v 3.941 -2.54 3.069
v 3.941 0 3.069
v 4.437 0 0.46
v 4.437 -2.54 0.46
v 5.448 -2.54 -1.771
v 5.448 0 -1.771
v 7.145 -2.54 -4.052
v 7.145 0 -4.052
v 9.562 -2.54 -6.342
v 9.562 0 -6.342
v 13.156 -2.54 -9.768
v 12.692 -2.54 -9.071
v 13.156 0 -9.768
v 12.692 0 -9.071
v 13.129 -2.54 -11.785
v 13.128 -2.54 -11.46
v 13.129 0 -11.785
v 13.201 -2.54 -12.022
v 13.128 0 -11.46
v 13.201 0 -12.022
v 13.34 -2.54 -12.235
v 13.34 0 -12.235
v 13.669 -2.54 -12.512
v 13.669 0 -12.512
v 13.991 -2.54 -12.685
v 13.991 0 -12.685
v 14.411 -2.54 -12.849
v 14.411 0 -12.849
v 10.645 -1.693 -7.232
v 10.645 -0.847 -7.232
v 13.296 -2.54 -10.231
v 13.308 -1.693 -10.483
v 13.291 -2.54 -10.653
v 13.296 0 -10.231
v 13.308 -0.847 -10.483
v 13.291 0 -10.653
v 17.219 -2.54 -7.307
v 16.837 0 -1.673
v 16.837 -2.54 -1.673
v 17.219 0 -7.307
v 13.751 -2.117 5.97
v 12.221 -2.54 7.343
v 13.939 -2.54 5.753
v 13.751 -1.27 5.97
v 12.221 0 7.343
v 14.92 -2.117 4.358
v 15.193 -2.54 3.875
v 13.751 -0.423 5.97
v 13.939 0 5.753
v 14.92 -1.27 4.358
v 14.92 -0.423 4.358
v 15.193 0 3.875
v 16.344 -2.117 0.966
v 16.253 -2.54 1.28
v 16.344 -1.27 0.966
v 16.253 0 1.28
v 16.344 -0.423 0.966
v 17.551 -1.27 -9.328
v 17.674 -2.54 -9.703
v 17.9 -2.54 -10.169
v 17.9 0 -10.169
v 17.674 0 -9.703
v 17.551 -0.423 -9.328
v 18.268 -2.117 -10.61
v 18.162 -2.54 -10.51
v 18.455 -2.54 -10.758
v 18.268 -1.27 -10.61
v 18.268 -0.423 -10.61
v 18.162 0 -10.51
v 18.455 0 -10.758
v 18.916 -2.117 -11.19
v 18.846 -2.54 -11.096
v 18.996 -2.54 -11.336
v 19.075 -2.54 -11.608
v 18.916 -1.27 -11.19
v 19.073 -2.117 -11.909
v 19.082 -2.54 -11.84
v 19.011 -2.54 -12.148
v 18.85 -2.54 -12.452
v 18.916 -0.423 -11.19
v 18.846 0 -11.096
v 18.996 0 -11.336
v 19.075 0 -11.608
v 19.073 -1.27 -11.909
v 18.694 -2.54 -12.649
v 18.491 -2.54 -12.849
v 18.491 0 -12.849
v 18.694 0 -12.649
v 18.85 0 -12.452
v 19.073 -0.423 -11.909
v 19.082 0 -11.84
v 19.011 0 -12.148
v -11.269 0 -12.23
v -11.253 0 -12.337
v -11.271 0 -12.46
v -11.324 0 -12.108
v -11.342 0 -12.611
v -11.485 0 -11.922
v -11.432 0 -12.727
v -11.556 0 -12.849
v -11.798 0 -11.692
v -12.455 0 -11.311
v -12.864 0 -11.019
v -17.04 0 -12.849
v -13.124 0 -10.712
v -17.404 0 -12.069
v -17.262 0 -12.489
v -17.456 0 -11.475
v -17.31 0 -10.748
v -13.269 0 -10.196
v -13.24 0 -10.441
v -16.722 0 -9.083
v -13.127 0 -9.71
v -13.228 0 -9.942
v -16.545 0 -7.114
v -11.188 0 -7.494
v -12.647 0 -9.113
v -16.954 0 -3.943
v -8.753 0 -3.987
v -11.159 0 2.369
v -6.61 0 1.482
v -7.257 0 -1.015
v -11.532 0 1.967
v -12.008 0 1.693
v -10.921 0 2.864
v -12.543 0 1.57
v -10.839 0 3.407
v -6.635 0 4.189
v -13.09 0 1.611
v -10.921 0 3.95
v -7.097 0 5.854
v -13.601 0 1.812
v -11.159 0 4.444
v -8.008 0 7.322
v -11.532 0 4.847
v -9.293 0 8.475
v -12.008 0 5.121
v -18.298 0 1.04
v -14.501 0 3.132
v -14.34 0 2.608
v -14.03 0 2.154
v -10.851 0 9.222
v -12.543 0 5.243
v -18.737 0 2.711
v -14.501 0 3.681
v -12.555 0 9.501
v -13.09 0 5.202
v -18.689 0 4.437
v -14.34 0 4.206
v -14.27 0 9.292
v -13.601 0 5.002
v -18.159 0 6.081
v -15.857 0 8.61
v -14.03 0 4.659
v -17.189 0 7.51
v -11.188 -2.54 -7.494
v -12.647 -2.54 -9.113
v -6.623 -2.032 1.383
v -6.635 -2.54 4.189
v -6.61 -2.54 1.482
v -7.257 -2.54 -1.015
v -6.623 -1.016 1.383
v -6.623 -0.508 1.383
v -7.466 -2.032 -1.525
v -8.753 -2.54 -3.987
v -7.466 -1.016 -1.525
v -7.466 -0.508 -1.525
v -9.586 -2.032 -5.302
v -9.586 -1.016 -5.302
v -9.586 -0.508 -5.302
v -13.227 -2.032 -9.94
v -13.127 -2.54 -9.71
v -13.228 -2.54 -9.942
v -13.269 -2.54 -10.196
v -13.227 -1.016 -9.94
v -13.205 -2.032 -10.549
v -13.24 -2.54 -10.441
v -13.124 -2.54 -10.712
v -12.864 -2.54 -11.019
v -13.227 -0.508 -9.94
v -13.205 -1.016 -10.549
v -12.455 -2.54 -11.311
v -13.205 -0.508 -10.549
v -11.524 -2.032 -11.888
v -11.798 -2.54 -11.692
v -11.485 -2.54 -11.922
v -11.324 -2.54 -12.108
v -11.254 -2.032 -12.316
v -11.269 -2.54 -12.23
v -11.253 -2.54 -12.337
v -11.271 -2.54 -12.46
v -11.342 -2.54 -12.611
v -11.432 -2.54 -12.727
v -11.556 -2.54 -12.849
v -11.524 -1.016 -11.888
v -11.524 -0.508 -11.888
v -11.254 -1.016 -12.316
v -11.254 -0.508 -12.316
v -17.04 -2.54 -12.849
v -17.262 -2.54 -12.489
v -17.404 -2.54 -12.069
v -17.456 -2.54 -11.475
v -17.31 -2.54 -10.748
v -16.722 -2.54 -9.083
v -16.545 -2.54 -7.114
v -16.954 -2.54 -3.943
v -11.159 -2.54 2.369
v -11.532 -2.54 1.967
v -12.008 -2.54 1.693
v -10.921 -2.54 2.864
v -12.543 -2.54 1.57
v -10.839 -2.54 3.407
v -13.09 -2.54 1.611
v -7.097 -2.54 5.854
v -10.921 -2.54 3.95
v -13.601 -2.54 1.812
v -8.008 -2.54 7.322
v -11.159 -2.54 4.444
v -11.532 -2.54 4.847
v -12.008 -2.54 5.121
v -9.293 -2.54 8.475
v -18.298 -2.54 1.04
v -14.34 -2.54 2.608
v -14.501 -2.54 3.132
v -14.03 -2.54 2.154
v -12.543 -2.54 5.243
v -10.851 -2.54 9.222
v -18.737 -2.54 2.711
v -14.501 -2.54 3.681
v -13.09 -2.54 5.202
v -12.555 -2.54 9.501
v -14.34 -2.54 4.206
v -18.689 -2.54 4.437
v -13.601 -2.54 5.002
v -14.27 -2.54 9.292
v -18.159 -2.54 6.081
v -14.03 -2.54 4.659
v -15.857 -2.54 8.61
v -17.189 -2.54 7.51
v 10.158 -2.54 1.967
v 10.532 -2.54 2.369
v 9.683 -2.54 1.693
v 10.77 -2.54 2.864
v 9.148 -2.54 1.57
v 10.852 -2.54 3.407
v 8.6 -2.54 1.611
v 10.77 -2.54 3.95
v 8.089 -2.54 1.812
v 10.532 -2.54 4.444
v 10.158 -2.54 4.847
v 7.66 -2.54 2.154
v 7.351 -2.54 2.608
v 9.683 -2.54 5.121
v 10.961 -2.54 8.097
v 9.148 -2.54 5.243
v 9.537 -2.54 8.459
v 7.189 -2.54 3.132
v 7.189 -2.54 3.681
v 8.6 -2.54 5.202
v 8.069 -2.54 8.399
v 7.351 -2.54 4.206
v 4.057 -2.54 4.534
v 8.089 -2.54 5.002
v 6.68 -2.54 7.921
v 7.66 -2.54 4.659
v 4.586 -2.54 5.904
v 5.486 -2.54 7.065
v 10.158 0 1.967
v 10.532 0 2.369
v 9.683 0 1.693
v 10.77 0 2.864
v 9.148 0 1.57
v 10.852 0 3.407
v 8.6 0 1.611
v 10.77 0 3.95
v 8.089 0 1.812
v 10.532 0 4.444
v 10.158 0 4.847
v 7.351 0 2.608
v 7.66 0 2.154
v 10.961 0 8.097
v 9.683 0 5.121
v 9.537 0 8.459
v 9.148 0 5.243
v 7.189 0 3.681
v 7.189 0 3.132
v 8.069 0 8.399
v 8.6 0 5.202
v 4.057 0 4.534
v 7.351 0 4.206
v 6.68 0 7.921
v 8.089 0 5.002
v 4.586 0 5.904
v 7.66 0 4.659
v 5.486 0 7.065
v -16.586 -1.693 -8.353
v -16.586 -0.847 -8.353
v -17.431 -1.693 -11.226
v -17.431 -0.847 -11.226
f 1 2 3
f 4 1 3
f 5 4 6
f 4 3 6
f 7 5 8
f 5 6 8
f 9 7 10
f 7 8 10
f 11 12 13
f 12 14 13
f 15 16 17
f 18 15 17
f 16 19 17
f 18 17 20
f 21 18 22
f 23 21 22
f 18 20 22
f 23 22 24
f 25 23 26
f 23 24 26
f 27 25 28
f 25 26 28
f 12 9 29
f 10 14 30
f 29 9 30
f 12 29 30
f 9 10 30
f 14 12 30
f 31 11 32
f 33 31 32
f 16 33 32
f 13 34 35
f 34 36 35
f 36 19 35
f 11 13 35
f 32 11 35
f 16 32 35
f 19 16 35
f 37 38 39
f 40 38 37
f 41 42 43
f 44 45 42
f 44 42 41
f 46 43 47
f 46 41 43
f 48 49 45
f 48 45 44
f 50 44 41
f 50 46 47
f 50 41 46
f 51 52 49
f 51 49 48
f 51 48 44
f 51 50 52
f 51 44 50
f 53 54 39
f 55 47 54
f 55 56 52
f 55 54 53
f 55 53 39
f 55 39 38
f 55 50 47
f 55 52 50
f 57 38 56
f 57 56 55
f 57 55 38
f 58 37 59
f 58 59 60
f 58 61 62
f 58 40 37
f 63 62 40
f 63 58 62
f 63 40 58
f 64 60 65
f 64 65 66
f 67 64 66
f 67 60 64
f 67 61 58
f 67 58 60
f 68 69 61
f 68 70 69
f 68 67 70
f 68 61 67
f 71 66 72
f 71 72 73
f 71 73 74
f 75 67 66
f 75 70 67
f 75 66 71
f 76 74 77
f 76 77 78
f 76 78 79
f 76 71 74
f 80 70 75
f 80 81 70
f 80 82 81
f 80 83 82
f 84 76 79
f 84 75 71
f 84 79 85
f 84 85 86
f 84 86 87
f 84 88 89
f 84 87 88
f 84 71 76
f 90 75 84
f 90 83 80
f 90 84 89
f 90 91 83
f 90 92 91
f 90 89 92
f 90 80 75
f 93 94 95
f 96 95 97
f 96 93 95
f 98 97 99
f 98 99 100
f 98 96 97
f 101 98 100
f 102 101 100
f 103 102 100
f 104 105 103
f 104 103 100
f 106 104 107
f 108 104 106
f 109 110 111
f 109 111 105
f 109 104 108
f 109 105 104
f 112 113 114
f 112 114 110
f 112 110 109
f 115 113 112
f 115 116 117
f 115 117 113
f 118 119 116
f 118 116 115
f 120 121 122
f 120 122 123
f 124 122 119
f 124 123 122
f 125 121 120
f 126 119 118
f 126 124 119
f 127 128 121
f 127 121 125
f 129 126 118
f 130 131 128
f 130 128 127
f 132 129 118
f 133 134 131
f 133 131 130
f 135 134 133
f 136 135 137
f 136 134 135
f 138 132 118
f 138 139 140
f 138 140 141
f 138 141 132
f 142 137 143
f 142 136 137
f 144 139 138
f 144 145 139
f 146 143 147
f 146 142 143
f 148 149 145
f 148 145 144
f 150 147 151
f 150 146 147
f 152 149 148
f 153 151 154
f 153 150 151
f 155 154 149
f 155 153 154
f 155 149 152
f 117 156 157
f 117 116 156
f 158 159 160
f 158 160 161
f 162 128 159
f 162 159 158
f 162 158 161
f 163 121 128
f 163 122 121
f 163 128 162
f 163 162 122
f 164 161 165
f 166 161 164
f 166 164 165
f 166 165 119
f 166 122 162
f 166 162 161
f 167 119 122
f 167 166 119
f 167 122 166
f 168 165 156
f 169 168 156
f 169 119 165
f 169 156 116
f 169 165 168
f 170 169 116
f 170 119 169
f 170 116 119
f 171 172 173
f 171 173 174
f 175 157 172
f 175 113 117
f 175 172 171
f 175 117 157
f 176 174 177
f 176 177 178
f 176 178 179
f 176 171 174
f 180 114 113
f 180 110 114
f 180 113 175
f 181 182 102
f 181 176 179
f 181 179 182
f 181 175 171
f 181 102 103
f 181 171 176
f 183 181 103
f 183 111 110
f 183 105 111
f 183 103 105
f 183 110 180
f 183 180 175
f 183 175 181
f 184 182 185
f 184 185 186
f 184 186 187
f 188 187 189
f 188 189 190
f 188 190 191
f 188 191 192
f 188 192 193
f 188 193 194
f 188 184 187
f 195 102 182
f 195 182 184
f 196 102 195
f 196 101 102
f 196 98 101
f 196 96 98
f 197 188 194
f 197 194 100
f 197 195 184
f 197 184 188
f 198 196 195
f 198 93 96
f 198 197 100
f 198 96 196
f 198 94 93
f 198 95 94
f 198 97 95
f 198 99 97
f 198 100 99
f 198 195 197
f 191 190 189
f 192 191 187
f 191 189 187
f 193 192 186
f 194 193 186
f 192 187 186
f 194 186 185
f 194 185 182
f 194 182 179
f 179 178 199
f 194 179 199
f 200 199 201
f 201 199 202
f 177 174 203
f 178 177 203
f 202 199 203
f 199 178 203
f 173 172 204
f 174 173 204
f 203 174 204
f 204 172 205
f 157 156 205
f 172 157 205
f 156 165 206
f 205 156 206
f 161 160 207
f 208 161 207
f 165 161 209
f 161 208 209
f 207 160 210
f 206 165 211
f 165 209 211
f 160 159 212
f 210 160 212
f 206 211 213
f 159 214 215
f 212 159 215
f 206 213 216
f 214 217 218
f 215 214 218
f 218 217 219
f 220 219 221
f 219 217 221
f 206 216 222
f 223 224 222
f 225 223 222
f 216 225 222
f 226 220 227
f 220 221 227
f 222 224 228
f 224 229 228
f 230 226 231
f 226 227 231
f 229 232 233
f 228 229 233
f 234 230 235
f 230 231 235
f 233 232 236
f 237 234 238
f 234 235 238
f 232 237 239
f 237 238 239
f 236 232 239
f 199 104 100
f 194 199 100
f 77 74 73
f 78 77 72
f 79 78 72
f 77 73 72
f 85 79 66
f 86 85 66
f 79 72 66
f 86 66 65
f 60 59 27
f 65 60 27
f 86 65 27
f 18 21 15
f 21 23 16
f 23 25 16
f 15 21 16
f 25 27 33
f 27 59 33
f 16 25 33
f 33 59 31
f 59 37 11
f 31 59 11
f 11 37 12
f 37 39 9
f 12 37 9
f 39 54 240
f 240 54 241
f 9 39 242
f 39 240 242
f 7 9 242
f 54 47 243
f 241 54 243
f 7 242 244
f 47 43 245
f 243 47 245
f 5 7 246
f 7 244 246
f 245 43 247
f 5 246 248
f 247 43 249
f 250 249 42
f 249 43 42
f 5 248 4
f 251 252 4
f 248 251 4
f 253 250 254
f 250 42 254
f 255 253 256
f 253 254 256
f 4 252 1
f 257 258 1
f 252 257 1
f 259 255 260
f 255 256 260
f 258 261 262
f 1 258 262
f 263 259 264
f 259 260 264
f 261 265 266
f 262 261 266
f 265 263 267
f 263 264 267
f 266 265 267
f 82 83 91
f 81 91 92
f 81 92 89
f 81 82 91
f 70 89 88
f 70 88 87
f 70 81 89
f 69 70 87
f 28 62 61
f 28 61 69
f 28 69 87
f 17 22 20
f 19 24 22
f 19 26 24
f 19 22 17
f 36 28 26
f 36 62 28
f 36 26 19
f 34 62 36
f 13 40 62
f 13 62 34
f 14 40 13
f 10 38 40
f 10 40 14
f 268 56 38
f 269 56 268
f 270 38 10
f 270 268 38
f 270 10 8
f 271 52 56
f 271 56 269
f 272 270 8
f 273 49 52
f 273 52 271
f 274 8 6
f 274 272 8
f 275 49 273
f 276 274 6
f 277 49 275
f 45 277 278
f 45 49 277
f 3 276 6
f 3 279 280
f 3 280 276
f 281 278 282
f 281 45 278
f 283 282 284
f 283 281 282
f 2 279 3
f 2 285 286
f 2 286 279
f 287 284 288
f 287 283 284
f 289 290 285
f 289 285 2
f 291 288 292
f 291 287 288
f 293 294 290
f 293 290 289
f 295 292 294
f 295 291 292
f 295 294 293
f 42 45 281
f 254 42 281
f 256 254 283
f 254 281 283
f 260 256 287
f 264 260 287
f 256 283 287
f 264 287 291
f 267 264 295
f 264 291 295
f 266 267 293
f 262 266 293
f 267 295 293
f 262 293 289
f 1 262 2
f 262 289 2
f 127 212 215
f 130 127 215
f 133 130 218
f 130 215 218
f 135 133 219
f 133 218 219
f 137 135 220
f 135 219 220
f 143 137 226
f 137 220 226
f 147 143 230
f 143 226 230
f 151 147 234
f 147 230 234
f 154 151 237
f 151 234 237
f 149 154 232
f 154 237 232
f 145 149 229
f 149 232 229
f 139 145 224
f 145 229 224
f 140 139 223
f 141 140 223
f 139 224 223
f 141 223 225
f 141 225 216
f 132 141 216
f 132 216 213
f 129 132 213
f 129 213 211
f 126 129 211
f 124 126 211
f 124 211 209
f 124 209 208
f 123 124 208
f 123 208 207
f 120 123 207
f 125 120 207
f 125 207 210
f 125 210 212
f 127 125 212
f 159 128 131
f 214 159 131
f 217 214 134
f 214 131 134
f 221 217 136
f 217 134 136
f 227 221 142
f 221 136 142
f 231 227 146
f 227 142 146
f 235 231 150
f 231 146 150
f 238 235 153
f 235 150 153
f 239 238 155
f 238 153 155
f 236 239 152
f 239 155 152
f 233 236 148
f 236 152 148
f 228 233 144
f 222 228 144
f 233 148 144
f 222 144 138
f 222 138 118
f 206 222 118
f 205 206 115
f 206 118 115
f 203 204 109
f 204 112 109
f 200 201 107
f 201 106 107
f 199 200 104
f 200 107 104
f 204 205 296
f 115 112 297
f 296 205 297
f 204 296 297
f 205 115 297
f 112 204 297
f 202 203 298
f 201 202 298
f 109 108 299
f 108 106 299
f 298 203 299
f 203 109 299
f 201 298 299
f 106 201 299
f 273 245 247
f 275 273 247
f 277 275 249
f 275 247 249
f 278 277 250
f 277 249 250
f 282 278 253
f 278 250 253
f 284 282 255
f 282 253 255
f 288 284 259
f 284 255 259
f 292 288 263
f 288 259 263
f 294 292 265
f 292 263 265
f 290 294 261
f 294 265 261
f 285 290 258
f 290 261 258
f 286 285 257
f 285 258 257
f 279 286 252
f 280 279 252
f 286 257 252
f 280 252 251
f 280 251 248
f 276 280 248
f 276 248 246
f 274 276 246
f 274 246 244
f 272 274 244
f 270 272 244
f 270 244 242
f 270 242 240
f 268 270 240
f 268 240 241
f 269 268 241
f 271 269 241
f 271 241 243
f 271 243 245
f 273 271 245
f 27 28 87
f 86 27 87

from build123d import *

# Parameters (mm, degrees)
F0_R     = 1.905
F1_DEPTH = 3.175
F2_SCALE = 0.8
F3_R     = 1.8415
F4_DEPTH = 2.5410001


with BuildPart() as f1:
    # F0 (on Front) → F1 (new body)
    with BuildSketch(Plane.XZ):
        with BuildLine():
            add(Edge.make_bspline(
                [(15.2766938218, 9.1789322707), (18.151094091, 7.1668521774), (20.9269990257, 1.23542886), (21.2277681546, -4.6540606662), (21.5838634633, -11.5705662324), (22.7053267286, -13.3069617185), (23.8727598783, -13.8782113098), (24.046701891, -15.238019906), (23.1143286587, -16.0615529811)],
                knots=[0, 0, 0, 0, 0.2560749835, 0.4646988923, 0.6791340304, 0.7917259994, 0.8783836268, 1, 1, 1, 1], degree=3))
            ThreePointArc((15.2766938218, 9.1789322707), (8.3501666844, 9.9010575477), (4.9268378045, 3.8364831619))
            add(Edge.make_bspline(
                [(4.9268378045, 3.8364831619), (5.346975618, -2.5843795785), (12.736862968, -8.5722075624), (17.843095969, -12.7321101967), (15.6024638024, -15.2424295391), (18.0134600164, -16.0615529811)],
                knots=[0, 0, 0, 0, 0.4888413716, 0.774721298, 1, 1, 1, 1], degree=3))
            Line((18.0134600164, -16.0615529811), (23.1143286587, -16.0615529811))
        make_face()
        with Locations((11.2628023327, 4.2584470189)):
            Circle(F0_R, mode=Mode.SUBTRACT)
    extrude(amount=F1_DEPTH)


with BuildPart() as f1b:
    # F0 (on Front) → F1, piece 2 (new body)
    with BuildSketch(Plane.XZ):
        with BuildLine():
            add(Edge.make_bspline(
                [(-8.2936335114, 5.2368499319), (-7.9824457686, 2.8333179563), (-8.4967454129, -1.9046579068), (-14.5115015192, -10.424185367), (-16.8502036964, -12.2101148814), (-16.3736586102, -14.1539483863), (-13.3133264784, -15.0594276561), (-14.4444399621, -16.0615529811)],
                knots=[0, 0, 0, 0, 0.2590953594, 0.5668054584, 0.72169025, 0.8465686818, 1, 1, 1, 1], degree=3))
            ThreePointArc((-8.2936335114, 5.2368499319), (-17.8371497576, 11.6149311281), (-22.8727331196, 1.2998197719))
            add(Edge.make_bspline(
                [(-22.8727331196, 1.2998197719), (-21.6541715744, -2.3029959403), (-19.6709242531, -10.4033567029), (-22.1587598592, -13.742231951), (-21.7158737806, -15.5478463297), (-21.2994578776, -16.0615529811)],
                knots=[0, 0, 0, 0, 0.505500983, 0.788586882, 1, 1, 1, 1], degree=3))
            Line((-21.2994578776, -16.0615529811), (-14.4444399621, -16.0615529811))
        make_face()
        with Locations((-15.8505593242, 4.2584470189)):
            Circle(F0_R, mode=Mode.SUBTRACT)
    extrude(amount=F1_DEPTH)


with BuildPart() as f1_1:
    # F2: moved
    add(f1.part.scale(F2_SCALE))


with BuildPart() as f1b_1:
    # F2: moved
    add(f1b.part.scale(F2_SCALE))


with BuildPart() as f4_tool:
    # F3 (on face) → F4 (new body, through all)
    with BuildSketch(Plane.XZ.offset(2.54)):
        with Locations((-12.6804474594, 3.4067576151)):
            Circle(F3_R)
        with Locations((9.0102418662, 3.4067576151)):
            Circle(F3_R)
    extrude(amount=-F4_DEPTH)


with BuildPart() as f1_2:
    add(f1_1.part)

    # F4: cut by f4_tool
    add(f4_tool.part, mode=Mode.SUBTRACT)


with BuildPart() as f1b_2:
    add(f1b_1.part)

    # F4: cut by f4_tool
    add(f4_tool.part, mode=Mode.SUBTRACT)


solid = Compound([f1_2.part, f1b_2.part])
